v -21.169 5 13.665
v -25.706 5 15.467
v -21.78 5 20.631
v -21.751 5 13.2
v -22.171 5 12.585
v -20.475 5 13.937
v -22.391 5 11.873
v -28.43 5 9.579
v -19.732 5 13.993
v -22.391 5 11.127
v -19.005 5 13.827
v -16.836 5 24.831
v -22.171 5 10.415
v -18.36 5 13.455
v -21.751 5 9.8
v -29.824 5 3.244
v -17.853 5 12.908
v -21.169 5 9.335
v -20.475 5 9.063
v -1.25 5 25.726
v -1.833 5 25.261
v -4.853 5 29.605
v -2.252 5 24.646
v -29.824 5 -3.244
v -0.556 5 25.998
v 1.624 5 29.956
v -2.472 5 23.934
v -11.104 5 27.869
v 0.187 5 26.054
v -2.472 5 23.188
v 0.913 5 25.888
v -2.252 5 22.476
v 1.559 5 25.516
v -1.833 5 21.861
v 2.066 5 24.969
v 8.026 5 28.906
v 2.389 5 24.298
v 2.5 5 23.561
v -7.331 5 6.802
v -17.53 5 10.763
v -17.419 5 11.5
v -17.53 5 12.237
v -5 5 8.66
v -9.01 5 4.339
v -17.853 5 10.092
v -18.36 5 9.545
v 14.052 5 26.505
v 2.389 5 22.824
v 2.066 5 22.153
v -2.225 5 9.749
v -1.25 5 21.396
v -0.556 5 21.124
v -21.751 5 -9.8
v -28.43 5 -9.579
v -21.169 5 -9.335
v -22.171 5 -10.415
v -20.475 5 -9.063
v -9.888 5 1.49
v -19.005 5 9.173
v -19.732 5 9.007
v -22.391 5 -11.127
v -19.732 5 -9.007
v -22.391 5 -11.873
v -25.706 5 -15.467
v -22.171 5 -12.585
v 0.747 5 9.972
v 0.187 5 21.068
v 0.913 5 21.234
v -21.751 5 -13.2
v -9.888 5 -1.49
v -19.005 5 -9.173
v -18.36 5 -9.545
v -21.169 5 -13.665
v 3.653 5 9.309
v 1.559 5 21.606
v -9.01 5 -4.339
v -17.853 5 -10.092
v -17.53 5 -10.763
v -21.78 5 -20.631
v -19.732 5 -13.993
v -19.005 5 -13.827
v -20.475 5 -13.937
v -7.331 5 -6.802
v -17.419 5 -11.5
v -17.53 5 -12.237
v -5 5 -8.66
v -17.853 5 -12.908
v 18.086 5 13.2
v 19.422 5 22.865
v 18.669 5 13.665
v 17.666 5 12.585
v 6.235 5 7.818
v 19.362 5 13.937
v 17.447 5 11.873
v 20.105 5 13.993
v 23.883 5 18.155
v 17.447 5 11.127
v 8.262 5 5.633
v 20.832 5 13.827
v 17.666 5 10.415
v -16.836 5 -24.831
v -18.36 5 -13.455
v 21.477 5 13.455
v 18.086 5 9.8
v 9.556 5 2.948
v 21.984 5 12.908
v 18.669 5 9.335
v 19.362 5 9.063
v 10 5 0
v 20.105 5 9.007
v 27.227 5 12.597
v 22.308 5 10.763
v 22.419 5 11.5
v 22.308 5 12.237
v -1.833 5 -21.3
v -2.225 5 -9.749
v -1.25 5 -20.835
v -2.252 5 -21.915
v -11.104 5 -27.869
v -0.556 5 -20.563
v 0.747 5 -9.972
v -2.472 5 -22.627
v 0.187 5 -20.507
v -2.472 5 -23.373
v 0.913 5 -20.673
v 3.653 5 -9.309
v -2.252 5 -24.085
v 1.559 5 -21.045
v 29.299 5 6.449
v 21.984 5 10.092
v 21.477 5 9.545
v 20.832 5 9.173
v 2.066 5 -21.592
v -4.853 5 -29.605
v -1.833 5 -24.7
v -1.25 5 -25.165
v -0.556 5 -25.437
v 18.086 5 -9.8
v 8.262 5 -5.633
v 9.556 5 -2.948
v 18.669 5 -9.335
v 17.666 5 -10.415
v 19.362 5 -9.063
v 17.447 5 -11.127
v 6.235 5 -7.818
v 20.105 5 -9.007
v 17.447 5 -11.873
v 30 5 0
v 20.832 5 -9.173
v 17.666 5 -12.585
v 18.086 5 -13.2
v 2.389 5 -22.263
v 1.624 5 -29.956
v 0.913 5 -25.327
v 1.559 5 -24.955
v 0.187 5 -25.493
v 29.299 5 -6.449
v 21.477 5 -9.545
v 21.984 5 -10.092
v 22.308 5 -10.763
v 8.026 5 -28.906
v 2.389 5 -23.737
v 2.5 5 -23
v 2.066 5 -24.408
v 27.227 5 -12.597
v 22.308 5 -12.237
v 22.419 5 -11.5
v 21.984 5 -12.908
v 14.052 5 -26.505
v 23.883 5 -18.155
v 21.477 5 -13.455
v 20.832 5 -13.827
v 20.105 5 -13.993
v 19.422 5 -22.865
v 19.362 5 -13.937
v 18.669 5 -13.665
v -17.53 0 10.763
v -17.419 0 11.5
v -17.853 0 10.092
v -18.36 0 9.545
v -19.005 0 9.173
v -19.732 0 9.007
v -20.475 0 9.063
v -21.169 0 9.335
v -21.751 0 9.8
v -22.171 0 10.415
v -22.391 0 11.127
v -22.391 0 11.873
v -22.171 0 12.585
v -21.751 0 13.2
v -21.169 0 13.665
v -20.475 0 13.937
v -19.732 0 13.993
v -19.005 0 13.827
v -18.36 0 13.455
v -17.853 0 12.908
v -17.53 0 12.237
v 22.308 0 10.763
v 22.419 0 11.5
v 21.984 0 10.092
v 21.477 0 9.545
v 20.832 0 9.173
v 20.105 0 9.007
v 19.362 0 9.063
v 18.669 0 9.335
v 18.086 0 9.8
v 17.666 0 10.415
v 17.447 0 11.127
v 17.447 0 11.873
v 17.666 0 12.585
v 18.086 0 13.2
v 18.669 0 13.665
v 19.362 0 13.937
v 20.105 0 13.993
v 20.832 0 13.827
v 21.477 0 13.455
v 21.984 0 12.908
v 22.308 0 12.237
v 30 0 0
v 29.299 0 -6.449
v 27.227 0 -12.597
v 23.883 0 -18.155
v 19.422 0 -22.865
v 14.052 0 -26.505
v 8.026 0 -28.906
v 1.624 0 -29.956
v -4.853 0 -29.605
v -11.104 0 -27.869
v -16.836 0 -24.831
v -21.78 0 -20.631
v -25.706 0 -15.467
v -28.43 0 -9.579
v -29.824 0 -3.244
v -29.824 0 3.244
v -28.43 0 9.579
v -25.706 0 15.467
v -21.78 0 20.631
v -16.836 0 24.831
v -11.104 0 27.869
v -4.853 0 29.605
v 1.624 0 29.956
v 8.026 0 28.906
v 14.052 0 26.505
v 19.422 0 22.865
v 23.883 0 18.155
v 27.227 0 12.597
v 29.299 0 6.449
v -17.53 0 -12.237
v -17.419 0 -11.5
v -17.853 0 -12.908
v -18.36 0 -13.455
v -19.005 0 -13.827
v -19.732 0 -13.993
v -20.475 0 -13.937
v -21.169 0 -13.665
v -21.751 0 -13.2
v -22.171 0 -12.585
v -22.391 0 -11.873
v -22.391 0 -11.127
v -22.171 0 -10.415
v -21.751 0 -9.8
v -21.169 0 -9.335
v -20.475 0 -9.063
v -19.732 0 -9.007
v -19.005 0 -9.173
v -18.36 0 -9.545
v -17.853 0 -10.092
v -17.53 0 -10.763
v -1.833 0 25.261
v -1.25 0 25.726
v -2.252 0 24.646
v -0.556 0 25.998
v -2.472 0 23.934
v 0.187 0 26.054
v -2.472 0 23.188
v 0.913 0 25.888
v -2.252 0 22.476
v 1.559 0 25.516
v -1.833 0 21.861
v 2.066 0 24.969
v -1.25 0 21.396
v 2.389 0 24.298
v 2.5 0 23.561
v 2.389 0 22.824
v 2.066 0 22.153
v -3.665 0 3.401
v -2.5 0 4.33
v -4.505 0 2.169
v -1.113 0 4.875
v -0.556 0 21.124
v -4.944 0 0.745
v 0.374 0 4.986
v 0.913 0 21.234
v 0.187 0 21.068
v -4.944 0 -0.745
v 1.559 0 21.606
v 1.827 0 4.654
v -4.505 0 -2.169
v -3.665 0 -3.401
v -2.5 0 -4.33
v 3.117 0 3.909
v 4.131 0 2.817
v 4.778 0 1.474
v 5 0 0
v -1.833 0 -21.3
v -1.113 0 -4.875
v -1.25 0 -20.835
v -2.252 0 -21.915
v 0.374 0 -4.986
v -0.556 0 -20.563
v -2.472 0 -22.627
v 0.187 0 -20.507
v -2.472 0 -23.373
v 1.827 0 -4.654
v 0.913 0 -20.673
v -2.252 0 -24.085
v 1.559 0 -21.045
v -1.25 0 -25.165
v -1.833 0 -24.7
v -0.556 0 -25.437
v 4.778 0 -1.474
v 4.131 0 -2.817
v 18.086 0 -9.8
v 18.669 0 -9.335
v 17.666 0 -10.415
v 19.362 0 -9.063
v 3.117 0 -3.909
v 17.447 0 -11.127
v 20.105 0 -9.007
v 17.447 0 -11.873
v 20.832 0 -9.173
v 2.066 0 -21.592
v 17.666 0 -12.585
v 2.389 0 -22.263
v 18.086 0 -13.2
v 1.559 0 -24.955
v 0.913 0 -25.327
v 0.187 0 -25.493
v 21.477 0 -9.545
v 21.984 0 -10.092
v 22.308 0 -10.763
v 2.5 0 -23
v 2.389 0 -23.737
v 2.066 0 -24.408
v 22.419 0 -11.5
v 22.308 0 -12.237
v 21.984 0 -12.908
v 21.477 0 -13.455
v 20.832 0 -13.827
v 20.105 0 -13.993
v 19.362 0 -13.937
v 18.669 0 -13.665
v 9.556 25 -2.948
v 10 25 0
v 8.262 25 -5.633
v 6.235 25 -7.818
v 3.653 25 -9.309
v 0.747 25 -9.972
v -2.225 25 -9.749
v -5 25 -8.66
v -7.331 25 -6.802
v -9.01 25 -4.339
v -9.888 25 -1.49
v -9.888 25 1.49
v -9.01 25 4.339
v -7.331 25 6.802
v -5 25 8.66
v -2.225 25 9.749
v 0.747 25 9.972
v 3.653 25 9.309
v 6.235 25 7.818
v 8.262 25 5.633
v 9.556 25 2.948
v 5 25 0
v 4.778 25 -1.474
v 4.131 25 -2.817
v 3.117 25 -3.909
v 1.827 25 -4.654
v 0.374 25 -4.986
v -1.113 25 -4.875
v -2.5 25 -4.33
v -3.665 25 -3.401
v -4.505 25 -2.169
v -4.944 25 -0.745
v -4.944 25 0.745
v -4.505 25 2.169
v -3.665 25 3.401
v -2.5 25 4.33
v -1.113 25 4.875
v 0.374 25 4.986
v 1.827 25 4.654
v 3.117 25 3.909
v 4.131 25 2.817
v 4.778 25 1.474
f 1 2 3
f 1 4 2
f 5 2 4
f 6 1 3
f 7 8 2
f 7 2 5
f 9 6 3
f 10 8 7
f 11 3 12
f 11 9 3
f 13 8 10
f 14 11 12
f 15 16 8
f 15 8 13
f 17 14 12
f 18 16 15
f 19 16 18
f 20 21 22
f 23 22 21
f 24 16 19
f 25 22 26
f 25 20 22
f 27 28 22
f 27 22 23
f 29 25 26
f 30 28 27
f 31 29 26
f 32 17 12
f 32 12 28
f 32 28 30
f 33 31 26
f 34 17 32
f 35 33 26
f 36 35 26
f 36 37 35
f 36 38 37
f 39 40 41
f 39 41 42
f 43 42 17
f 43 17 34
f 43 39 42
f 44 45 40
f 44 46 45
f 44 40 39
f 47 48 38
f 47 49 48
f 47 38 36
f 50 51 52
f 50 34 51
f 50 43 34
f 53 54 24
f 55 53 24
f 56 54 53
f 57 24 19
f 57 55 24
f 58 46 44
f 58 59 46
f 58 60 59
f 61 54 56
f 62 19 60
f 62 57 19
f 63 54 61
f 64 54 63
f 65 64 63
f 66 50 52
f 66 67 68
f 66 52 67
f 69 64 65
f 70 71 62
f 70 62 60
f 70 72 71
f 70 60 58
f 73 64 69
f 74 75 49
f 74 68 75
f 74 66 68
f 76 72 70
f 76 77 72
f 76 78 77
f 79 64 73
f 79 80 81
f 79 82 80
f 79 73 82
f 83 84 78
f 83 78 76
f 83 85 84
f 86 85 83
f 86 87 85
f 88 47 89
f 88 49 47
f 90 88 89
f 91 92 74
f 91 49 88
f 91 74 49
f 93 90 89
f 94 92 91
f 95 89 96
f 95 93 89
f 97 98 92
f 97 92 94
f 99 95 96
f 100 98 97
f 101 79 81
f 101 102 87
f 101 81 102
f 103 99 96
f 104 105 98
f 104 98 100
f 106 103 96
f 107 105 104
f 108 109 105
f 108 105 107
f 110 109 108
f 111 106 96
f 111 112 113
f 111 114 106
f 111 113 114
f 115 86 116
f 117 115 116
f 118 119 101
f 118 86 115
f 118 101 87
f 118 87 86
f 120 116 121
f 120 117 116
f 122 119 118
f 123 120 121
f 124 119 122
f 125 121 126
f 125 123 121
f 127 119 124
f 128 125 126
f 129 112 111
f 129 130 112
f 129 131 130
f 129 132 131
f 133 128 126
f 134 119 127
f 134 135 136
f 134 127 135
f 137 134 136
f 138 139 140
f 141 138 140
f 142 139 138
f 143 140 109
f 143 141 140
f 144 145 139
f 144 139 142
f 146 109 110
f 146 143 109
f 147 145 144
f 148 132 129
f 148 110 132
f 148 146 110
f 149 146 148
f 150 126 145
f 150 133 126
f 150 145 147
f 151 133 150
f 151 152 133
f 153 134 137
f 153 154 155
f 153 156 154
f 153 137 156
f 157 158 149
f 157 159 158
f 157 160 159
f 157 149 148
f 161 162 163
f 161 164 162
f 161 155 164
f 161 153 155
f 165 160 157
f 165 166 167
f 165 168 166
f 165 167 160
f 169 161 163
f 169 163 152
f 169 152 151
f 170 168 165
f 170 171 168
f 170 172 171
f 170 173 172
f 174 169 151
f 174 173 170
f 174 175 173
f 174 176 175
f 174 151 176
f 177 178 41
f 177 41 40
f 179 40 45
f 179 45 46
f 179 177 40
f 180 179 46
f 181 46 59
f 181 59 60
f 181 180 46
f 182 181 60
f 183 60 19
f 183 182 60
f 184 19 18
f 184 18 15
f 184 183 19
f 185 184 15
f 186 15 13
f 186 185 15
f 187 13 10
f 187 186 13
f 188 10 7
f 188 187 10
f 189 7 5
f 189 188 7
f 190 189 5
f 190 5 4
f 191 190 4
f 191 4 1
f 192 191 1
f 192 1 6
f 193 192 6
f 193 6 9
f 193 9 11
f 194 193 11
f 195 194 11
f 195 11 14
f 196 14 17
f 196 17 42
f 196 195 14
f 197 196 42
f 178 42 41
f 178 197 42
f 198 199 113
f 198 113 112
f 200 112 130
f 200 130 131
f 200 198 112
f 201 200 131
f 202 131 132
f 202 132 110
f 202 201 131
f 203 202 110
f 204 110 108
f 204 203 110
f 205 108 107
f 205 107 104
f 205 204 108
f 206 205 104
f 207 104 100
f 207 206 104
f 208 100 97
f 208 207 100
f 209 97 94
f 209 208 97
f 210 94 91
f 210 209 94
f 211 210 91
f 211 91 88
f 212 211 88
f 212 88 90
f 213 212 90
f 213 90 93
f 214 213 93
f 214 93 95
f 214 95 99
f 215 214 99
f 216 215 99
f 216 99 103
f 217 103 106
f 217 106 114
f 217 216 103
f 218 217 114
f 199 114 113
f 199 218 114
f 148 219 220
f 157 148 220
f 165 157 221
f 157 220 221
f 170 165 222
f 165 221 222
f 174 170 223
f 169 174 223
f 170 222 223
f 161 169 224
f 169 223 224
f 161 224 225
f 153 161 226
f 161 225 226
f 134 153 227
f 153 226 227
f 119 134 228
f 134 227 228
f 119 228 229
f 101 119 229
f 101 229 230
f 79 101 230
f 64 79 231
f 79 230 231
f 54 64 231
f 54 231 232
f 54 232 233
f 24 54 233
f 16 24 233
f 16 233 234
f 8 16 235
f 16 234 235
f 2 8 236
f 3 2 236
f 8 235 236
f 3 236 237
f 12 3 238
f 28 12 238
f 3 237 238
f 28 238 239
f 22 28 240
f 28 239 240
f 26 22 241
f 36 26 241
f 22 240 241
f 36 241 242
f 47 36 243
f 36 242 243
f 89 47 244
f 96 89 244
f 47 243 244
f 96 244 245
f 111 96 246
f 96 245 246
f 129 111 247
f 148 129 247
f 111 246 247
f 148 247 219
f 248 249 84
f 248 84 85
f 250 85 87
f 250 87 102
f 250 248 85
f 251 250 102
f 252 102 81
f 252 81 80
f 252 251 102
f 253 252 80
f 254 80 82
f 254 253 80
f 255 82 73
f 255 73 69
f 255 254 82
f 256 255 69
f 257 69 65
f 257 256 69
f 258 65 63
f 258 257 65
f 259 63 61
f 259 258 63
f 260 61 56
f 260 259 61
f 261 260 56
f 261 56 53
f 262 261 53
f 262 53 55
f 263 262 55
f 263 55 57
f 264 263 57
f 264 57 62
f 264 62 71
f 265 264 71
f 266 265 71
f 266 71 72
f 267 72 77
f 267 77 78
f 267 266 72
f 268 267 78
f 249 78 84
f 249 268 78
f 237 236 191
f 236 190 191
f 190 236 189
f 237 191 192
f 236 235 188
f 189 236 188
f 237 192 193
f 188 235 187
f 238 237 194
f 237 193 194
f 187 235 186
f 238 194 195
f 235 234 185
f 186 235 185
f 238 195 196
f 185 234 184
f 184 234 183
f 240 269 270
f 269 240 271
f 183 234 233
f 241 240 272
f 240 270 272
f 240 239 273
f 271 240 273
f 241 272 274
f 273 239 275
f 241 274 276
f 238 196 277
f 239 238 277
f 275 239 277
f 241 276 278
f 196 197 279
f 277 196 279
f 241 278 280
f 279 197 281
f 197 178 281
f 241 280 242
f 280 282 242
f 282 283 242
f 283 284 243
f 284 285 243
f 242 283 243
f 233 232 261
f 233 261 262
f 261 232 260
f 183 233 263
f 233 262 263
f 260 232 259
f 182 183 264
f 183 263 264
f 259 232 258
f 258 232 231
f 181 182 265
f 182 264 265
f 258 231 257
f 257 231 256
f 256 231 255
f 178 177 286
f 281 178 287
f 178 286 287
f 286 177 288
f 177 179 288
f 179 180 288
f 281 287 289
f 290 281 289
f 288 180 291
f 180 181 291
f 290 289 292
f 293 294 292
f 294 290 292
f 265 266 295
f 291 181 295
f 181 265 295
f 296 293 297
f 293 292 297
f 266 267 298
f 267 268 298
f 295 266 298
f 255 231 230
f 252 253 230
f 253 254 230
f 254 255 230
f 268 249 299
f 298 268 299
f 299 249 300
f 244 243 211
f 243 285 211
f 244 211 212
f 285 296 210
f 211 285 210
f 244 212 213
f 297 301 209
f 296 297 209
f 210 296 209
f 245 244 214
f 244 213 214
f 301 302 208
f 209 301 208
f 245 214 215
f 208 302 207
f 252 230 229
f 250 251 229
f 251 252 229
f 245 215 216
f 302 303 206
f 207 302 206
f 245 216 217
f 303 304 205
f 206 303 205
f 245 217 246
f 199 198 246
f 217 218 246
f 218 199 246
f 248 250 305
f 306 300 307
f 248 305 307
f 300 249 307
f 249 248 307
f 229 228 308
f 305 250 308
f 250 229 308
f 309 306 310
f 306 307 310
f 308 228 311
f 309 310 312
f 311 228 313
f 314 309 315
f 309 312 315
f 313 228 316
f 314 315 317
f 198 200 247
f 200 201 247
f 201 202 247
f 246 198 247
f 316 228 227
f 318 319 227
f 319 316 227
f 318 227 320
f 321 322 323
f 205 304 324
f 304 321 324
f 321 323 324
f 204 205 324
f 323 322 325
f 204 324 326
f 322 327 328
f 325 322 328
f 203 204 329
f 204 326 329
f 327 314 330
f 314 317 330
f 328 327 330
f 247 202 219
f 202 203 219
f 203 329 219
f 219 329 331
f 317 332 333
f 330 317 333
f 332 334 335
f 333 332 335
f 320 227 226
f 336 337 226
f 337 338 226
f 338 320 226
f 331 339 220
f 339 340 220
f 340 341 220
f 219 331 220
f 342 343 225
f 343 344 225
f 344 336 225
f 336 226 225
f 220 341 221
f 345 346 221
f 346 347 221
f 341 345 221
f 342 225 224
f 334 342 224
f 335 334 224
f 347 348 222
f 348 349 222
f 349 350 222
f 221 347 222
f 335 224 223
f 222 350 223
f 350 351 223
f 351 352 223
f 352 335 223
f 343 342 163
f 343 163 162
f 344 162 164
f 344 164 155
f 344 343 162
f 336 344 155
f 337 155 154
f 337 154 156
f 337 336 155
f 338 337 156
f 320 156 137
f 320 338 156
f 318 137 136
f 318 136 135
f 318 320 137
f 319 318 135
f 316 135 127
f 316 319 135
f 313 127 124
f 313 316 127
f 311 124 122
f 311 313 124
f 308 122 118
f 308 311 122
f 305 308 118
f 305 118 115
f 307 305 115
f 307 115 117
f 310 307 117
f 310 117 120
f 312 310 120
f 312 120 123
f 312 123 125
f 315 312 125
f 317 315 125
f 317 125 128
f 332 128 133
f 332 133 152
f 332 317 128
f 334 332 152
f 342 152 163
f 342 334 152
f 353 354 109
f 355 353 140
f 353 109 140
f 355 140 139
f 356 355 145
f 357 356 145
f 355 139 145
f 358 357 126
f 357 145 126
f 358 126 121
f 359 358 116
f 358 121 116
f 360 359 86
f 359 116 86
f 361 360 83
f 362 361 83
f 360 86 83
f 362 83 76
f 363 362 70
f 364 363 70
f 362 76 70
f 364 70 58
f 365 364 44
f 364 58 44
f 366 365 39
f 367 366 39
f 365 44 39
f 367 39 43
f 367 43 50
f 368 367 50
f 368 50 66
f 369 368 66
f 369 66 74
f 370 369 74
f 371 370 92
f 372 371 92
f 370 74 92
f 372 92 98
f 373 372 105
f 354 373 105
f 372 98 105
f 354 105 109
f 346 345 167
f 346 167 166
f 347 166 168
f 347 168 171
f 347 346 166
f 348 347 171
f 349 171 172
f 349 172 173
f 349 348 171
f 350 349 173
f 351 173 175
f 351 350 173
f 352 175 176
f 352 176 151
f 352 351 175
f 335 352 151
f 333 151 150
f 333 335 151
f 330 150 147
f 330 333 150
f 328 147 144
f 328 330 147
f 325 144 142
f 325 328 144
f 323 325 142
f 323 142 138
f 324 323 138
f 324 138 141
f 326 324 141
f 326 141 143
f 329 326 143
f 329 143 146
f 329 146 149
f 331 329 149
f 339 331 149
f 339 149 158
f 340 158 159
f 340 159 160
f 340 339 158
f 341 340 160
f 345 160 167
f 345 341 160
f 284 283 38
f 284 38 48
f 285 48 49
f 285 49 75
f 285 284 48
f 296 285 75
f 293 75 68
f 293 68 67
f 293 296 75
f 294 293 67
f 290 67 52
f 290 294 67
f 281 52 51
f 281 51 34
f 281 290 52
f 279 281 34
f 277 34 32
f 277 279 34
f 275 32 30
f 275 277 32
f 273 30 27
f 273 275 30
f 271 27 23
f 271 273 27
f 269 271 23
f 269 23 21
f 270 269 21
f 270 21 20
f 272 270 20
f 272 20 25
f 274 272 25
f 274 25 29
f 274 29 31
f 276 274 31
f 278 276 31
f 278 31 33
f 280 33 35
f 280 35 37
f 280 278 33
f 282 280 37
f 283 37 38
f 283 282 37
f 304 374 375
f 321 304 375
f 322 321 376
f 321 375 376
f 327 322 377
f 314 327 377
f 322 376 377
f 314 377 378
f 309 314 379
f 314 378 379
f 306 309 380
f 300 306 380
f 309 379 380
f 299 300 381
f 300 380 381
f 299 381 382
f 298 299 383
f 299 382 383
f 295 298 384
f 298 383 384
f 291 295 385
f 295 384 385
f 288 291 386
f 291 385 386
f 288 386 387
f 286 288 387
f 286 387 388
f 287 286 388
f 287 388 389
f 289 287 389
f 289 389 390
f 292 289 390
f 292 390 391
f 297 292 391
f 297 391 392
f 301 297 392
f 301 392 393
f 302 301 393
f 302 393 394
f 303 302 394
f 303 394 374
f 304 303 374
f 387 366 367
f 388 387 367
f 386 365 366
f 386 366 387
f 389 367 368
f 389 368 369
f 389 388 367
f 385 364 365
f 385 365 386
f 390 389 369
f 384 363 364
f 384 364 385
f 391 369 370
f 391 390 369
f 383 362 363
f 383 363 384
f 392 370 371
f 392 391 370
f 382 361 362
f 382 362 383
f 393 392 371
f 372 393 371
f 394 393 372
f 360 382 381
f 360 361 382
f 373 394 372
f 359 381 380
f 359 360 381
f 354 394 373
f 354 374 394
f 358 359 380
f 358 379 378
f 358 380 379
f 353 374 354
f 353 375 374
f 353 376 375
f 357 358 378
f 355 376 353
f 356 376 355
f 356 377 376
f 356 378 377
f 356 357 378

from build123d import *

# Parameters (mm, degrees)
SKETCH1_R           = 30
SKETCH1_R_2         = 2.5
BOSS_EXTRUDE2_DEPTH = 5
SKETCH2_R           = 10
BOSS_EXTRUDE3_DEPTH = 20
SKETCH3_R           = 5
CUT_EXTRUDE1_DEPTH  = 45


with BuildPart() as part:
    # Sketch1 → Boss-Extrude2 (new body)
    with BuildSketch(Plane(origin=(0, 0, 0), x_dir=(1, 0, 0), z_dir=(0, 1, 0))):
        Circle(SKETCH1_R)
        with Locations((0, 23)):
            Circle(SKETCH1_R_2, mode=Mode.SUBTRACT)
        with Locations((19.918584287, 11.5)):
            Circle(SKETCH1_R_2, mode=Mode.SUBTRACT)
        with Locations((19.918584287, -11.5)):
            Circle(SKETCH1_R_2, mode=Mode.SUBTRACT)
        with Locations((0, -23.561037846)):
            Circle(SKETCH1_R_2, mode=Mode.SUBTRACT)
        with Locations((-19.918584287, -11.5)):
            Circle(SKETCH1_R_2, mode=Mode.SUBTRACT)
        with Locations((-19.918584287, 11.5)):
            Circle(SKETCH1_R_2, mode=Mode.SUBTRACT)
    extrude(amount=BOSS_EXTRUDE2_DEPTH)

    # Sketch2 → Boss-Extrude3 (add)
    with BuildSketch(Plane(origin=(0, 5, 0), x_dir=(1, 0, 0), z_dir=(0, 1, 0))):
        Circle(SKETCH2_R)
    extrude(amount=BOSS_EXTRUDE3_DEPTH)

    # Sketch3 → Cut-Extrude1 (cut)
    with BuildSketch(Plane(origin=(0, 25, 0), x_dir=(1, 0, 0), z_dir=(0, 1, 0))):
        Circle(SKETCH3_R)
    extrude(amount=-CUT_EXTRUDE1_DEPTH, mode=Mode.SUBTRACT)


solid = part.part
